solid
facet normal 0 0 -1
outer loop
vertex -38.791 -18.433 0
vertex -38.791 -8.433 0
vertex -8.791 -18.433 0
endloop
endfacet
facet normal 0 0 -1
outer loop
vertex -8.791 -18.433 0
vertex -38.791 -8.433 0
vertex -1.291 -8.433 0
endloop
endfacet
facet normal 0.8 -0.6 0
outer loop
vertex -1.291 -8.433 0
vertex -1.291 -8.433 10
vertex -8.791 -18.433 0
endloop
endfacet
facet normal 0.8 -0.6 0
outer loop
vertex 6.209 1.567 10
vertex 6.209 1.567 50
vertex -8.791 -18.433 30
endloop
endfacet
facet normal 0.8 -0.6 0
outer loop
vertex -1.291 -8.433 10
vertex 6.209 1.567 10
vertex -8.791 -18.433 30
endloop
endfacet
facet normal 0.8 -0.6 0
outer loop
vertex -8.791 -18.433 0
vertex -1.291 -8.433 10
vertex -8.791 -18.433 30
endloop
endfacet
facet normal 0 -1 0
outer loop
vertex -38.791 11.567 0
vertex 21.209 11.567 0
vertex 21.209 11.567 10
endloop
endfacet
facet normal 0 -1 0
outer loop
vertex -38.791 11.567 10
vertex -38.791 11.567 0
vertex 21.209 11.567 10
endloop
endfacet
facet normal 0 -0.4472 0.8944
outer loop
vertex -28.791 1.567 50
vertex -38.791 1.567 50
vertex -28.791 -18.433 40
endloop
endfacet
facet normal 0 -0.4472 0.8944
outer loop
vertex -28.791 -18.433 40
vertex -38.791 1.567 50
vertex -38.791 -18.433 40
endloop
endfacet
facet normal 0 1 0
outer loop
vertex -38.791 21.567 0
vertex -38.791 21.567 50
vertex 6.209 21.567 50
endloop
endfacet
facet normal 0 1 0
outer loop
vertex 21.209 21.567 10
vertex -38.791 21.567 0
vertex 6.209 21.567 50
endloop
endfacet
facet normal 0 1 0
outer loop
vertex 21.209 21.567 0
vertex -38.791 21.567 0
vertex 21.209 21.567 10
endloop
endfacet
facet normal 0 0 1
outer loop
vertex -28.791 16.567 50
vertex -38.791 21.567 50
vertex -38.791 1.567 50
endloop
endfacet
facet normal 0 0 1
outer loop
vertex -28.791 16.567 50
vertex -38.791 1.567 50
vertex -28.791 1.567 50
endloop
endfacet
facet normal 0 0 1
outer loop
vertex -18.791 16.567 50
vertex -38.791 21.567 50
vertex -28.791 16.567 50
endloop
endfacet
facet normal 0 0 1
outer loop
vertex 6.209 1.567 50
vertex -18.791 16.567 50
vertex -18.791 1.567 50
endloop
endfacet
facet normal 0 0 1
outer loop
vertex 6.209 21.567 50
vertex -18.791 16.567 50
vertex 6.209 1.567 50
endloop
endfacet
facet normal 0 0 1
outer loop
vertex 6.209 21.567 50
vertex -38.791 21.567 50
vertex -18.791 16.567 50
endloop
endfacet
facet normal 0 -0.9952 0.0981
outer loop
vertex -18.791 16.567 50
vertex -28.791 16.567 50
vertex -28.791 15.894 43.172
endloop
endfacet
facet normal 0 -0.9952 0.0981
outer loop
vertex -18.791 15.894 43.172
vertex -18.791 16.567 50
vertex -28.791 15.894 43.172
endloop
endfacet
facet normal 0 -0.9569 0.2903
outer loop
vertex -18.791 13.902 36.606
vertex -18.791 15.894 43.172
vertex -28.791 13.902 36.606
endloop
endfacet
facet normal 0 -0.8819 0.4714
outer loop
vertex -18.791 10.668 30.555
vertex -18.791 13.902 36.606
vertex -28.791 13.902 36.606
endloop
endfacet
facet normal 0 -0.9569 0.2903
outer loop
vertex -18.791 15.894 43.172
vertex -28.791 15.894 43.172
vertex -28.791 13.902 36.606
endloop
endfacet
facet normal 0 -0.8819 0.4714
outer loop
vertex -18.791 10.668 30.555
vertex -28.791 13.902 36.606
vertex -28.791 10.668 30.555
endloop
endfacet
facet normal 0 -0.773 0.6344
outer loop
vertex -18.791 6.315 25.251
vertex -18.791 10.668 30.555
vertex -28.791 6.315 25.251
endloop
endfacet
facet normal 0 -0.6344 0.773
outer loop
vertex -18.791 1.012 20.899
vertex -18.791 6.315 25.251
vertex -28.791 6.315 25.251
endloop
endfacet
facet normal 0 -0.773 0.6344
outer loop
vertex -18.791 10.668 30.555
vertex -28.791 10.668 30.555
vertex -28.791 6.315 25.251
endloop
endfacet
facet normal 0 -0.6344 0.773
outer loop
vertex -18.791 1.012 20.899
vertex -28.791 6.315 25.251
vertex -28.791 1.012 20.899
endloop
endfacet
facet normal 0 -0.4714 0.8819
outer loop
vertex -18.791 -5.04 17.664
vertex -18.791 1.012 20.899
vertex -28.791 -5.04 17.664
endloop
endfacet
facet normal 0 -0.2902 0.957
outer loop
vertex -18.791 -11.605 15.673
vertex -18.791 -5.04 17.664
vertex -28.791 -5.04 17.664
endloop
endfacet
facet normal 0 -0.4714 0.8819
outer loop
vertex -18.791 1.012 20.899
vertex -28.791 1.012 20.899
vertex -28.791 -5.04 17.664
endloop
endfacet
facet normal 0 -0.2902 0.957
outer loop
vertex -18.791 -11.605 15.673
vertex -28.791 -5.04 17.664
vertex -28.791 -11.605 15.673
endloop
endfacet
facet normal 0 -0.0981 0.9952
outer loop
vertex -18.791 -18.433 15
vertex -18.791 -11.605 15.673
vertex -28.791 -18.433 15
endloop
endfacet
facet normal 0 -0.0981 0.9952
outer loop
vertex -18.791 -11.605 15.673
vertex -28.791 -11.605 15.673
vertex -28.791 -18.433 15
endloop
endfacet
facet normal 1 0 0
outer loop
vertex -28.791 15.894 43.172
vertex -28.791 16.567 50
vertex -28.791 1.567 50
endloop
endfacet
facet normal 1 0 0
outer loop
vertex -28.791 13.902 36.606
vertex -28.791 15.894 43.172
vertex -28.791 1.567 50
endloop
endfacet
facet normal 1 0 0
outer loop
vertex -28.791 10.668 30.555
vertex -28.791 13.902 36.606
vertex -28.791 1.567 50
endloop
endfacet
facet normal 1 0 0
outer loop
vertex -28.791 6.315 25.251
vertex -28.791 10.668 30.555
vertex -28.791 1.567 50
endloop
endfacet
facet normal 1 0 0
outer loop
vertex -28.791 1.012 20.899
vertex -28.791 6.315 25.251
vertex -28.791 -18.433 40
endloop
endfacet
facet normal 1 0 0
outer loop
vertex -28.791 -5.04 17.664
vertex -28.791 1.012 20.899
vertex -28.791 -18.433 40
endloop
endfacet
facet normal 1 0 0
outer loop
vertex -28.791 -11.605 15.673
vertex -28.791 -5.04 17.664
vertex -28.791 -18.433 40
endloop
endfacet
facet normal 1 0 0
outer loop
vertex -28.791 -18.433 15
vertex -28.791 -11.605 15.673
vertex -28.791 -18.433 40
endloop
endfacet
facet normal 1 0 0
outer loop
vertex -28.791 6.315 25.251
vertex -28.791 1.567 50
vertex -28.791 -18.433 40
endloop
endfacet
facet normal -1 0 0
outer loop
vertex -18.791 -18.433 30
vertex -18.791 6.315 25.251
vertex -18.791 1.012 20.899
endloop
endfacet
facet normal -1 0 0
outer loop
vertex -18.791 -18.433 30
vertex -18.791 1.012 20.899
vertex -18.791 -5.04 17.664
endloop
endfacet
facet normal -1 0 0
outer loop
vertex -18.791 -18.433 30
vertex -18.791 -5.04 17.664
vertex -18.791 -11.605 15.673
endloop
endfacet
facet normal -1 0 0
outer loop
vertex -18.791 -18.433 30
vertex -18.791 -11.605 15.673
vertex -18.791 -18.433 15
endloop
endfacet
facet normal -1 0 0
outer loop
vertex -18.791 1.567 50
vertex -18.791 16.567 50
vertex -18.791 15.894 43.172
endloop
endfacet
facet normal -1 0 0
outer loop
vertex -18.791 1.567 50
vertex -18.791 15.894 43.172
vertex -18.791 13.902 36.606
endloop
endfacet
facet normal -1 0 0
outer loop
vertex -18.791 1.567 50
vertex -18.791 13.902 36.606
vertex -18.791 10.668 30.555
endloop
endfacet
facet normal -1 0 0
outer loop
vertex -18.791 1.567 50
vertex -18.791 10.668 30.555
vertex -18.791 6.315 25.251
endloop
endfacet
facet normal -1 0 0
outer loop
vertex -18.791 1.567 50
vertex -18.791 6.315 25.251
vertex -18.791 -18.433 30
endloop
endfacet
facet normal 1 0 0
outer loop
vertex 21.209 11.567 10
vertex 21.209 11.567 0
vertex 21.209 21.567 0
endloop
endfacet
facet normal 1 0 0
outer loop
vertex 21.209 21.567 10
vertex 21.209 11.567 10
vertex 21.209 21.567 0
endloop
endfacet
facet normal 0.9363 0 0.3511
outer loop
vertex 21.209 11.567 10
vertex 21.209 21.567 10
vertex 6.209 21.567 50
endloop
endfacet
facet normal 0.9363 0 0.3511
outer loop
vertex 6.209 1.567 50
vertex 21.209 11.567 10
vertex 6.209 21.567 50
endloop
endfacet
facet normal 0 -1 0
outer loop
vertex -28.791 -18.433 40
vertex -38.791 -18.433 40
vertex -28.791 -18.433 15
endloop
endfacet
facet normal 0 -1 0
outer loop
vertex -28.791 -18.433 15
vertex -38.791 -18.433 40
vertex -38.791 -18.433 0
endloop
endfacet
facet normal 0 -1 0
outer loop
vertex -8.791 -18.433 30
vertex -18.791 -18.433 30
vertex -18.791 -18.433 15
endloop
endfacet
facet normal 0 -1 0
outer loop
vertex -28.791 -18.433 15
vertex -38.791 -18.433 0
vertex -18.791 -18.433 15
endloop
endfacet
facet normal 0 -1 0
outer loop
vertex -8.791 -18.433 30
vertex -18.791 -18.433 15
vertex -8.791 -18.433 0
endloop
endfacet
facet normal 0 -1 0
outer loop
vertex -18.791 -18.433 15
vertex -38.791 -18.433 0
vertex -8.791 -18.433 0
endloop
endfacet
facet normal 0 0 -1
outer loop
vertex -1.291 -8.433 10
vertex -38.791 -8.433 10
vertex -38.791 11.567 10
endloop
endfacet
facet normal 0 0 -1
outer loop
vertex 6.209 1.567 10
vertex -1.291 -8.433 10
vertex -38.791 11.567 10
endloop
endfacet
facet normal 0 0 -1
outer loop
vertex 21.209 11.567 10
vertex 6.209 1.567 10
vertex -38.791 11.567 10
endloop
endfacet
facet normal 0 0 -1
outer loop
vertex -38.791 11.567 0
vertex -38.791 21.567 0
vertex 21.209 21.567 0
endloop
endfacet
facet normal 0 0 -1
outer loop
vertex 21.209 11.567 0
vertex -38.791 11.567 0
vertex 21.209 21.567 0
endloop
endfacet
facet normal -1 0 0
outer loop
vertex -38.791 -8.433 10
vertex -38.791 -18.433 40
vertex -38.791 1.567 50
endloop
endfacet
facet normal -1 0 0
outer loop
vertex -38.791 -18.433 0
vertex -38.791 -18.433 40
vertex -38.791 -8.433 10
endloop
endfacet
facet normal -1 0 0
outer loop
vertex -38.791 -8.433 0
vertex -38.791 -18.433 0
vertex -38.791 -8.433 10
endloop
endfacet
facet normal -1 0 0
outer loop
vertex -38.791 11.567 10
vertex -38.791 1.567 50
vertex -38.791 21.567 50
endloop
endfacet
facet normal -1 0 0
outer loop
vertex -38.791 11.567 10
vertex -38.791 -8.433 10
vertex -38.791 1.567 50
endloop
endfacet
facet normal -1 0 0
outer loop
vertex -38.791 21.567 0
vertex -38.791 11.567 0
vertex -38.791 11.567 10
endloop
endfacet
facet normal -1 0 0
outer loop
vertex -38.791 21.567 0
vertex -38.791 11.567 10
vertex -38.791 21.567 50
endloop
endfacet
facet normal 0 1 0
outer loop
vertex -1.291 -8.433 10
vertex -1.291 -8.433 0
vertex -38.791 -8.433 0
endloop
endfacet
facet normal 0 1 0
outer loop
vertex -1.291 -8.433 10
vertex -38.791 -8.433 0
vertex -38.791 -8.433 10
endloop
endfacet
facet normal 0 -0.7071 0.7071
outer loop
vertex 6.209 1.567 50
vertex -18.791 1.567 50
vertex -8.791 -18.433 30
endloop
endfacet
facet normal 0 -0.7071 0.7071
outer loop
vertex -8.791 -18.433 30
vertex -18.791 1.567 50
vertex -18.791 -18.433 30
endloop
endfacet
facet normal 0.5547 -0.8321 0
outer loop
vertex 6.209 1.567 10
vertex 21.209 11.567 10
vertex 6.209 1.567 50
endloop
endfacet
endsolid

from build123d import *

# Parameters (mm, degrees)
F0_W      = 60
F0_H      = 40
F1_DEPTH  = 50
F3_R      = 35
F4_DEPTH  = 10
F6_DEPTH  = 10
F7_W      = 20
F7_H      = 10
F8_DEPTH  = 60
F10_DEPTH = 50.001
F12_DEPTH = 25
F14_DEPTH = 25


with BuildPart() as f1:
    # F0 (on Top) → F1 (new body)
    with BuildSketch(Plane.XY):
        with Locations((-8.7906960398, 1.5665522108)):
            Rectangle(F0_W, F0_H)
    extrude(amount=F1_DEPTH)

    # F3 (on offset) → F4 (cut)
    with BuildSketch(Plane(origin=(-28.7906960398, 0, 0), x_dir=(0, -1, 0), z_dir=(-1, 0, 0))):
        with Locations((18.4334477892, 50)):
            Circle(F3_R)
    extrude(amount=-F4_DEPTH, mode=Mode.SUBTRACT)

    # F5 (on face) → F6 (cut)
    with BuildSketch(Plane(origin=(-38.7906960398, 0, 0), x_dir=(0, -1, 0), z_dir=(-1, 0, 0))):
        Polygon((18.4334477892, 50), (-1.5665522108, 50), (18.4334477892, 40), align=None)
    extrude(amount=-F6_DEPTH, mode=Mode.SUBTRACT)

    # F7 (on face) → F8 (cut, through all)
    with BuildSketch(Plane.YZ.offset(21.2093039602)):
        with Locations((1.5665522108, 5)):
            Rectangle(F7_W, F7_H)
    extrude(amount=-F8_DEPTH, mode=Mode.SUBTRACT)

    # F9 (on face) → F10 (cut, through all)
    with BuildSketch(Plane.XY.offset(50)):
        Polygon((21.2093039602, -18.4334477892), (21.2093039602, 11.5665522108), (6.2093039602, 1.5665522108), (-8.7906960398, -18.4334477892), align=None)
    extrude(amount=-F10_DEPTH, mode=Mode.SUBTRACT)

    # F11 (on face) → F12 (cut)
    with BuildSketch(Plane(origin=(0, 21.5665522108, 0), x_dir=(-1, 0, 0), z_dir=(0, 1, 0))):
        Polygon((-6.2093039602, 50), (-21.2093039602, 50), (-21.2093039602, 10), align=None)
    extrude(amount=-F12_DEPTH, mode=Mode.SUBTRACT)

    # F13 (on face) → F14 (cut)
    with BuildSketch(Plane(origin=(-18.7906960398, 0, 0), x_dir=(0, -1, 0), z_dir=(-1, 0, 0))):
        Polygon((18.4334477892, 50), (-1.5665522108, 50), (18.4334477892, 30), align=None)
    extrude(amount=-F14_DEPTH, mode=Mode.SUBTRACT)


solid = f1.part
